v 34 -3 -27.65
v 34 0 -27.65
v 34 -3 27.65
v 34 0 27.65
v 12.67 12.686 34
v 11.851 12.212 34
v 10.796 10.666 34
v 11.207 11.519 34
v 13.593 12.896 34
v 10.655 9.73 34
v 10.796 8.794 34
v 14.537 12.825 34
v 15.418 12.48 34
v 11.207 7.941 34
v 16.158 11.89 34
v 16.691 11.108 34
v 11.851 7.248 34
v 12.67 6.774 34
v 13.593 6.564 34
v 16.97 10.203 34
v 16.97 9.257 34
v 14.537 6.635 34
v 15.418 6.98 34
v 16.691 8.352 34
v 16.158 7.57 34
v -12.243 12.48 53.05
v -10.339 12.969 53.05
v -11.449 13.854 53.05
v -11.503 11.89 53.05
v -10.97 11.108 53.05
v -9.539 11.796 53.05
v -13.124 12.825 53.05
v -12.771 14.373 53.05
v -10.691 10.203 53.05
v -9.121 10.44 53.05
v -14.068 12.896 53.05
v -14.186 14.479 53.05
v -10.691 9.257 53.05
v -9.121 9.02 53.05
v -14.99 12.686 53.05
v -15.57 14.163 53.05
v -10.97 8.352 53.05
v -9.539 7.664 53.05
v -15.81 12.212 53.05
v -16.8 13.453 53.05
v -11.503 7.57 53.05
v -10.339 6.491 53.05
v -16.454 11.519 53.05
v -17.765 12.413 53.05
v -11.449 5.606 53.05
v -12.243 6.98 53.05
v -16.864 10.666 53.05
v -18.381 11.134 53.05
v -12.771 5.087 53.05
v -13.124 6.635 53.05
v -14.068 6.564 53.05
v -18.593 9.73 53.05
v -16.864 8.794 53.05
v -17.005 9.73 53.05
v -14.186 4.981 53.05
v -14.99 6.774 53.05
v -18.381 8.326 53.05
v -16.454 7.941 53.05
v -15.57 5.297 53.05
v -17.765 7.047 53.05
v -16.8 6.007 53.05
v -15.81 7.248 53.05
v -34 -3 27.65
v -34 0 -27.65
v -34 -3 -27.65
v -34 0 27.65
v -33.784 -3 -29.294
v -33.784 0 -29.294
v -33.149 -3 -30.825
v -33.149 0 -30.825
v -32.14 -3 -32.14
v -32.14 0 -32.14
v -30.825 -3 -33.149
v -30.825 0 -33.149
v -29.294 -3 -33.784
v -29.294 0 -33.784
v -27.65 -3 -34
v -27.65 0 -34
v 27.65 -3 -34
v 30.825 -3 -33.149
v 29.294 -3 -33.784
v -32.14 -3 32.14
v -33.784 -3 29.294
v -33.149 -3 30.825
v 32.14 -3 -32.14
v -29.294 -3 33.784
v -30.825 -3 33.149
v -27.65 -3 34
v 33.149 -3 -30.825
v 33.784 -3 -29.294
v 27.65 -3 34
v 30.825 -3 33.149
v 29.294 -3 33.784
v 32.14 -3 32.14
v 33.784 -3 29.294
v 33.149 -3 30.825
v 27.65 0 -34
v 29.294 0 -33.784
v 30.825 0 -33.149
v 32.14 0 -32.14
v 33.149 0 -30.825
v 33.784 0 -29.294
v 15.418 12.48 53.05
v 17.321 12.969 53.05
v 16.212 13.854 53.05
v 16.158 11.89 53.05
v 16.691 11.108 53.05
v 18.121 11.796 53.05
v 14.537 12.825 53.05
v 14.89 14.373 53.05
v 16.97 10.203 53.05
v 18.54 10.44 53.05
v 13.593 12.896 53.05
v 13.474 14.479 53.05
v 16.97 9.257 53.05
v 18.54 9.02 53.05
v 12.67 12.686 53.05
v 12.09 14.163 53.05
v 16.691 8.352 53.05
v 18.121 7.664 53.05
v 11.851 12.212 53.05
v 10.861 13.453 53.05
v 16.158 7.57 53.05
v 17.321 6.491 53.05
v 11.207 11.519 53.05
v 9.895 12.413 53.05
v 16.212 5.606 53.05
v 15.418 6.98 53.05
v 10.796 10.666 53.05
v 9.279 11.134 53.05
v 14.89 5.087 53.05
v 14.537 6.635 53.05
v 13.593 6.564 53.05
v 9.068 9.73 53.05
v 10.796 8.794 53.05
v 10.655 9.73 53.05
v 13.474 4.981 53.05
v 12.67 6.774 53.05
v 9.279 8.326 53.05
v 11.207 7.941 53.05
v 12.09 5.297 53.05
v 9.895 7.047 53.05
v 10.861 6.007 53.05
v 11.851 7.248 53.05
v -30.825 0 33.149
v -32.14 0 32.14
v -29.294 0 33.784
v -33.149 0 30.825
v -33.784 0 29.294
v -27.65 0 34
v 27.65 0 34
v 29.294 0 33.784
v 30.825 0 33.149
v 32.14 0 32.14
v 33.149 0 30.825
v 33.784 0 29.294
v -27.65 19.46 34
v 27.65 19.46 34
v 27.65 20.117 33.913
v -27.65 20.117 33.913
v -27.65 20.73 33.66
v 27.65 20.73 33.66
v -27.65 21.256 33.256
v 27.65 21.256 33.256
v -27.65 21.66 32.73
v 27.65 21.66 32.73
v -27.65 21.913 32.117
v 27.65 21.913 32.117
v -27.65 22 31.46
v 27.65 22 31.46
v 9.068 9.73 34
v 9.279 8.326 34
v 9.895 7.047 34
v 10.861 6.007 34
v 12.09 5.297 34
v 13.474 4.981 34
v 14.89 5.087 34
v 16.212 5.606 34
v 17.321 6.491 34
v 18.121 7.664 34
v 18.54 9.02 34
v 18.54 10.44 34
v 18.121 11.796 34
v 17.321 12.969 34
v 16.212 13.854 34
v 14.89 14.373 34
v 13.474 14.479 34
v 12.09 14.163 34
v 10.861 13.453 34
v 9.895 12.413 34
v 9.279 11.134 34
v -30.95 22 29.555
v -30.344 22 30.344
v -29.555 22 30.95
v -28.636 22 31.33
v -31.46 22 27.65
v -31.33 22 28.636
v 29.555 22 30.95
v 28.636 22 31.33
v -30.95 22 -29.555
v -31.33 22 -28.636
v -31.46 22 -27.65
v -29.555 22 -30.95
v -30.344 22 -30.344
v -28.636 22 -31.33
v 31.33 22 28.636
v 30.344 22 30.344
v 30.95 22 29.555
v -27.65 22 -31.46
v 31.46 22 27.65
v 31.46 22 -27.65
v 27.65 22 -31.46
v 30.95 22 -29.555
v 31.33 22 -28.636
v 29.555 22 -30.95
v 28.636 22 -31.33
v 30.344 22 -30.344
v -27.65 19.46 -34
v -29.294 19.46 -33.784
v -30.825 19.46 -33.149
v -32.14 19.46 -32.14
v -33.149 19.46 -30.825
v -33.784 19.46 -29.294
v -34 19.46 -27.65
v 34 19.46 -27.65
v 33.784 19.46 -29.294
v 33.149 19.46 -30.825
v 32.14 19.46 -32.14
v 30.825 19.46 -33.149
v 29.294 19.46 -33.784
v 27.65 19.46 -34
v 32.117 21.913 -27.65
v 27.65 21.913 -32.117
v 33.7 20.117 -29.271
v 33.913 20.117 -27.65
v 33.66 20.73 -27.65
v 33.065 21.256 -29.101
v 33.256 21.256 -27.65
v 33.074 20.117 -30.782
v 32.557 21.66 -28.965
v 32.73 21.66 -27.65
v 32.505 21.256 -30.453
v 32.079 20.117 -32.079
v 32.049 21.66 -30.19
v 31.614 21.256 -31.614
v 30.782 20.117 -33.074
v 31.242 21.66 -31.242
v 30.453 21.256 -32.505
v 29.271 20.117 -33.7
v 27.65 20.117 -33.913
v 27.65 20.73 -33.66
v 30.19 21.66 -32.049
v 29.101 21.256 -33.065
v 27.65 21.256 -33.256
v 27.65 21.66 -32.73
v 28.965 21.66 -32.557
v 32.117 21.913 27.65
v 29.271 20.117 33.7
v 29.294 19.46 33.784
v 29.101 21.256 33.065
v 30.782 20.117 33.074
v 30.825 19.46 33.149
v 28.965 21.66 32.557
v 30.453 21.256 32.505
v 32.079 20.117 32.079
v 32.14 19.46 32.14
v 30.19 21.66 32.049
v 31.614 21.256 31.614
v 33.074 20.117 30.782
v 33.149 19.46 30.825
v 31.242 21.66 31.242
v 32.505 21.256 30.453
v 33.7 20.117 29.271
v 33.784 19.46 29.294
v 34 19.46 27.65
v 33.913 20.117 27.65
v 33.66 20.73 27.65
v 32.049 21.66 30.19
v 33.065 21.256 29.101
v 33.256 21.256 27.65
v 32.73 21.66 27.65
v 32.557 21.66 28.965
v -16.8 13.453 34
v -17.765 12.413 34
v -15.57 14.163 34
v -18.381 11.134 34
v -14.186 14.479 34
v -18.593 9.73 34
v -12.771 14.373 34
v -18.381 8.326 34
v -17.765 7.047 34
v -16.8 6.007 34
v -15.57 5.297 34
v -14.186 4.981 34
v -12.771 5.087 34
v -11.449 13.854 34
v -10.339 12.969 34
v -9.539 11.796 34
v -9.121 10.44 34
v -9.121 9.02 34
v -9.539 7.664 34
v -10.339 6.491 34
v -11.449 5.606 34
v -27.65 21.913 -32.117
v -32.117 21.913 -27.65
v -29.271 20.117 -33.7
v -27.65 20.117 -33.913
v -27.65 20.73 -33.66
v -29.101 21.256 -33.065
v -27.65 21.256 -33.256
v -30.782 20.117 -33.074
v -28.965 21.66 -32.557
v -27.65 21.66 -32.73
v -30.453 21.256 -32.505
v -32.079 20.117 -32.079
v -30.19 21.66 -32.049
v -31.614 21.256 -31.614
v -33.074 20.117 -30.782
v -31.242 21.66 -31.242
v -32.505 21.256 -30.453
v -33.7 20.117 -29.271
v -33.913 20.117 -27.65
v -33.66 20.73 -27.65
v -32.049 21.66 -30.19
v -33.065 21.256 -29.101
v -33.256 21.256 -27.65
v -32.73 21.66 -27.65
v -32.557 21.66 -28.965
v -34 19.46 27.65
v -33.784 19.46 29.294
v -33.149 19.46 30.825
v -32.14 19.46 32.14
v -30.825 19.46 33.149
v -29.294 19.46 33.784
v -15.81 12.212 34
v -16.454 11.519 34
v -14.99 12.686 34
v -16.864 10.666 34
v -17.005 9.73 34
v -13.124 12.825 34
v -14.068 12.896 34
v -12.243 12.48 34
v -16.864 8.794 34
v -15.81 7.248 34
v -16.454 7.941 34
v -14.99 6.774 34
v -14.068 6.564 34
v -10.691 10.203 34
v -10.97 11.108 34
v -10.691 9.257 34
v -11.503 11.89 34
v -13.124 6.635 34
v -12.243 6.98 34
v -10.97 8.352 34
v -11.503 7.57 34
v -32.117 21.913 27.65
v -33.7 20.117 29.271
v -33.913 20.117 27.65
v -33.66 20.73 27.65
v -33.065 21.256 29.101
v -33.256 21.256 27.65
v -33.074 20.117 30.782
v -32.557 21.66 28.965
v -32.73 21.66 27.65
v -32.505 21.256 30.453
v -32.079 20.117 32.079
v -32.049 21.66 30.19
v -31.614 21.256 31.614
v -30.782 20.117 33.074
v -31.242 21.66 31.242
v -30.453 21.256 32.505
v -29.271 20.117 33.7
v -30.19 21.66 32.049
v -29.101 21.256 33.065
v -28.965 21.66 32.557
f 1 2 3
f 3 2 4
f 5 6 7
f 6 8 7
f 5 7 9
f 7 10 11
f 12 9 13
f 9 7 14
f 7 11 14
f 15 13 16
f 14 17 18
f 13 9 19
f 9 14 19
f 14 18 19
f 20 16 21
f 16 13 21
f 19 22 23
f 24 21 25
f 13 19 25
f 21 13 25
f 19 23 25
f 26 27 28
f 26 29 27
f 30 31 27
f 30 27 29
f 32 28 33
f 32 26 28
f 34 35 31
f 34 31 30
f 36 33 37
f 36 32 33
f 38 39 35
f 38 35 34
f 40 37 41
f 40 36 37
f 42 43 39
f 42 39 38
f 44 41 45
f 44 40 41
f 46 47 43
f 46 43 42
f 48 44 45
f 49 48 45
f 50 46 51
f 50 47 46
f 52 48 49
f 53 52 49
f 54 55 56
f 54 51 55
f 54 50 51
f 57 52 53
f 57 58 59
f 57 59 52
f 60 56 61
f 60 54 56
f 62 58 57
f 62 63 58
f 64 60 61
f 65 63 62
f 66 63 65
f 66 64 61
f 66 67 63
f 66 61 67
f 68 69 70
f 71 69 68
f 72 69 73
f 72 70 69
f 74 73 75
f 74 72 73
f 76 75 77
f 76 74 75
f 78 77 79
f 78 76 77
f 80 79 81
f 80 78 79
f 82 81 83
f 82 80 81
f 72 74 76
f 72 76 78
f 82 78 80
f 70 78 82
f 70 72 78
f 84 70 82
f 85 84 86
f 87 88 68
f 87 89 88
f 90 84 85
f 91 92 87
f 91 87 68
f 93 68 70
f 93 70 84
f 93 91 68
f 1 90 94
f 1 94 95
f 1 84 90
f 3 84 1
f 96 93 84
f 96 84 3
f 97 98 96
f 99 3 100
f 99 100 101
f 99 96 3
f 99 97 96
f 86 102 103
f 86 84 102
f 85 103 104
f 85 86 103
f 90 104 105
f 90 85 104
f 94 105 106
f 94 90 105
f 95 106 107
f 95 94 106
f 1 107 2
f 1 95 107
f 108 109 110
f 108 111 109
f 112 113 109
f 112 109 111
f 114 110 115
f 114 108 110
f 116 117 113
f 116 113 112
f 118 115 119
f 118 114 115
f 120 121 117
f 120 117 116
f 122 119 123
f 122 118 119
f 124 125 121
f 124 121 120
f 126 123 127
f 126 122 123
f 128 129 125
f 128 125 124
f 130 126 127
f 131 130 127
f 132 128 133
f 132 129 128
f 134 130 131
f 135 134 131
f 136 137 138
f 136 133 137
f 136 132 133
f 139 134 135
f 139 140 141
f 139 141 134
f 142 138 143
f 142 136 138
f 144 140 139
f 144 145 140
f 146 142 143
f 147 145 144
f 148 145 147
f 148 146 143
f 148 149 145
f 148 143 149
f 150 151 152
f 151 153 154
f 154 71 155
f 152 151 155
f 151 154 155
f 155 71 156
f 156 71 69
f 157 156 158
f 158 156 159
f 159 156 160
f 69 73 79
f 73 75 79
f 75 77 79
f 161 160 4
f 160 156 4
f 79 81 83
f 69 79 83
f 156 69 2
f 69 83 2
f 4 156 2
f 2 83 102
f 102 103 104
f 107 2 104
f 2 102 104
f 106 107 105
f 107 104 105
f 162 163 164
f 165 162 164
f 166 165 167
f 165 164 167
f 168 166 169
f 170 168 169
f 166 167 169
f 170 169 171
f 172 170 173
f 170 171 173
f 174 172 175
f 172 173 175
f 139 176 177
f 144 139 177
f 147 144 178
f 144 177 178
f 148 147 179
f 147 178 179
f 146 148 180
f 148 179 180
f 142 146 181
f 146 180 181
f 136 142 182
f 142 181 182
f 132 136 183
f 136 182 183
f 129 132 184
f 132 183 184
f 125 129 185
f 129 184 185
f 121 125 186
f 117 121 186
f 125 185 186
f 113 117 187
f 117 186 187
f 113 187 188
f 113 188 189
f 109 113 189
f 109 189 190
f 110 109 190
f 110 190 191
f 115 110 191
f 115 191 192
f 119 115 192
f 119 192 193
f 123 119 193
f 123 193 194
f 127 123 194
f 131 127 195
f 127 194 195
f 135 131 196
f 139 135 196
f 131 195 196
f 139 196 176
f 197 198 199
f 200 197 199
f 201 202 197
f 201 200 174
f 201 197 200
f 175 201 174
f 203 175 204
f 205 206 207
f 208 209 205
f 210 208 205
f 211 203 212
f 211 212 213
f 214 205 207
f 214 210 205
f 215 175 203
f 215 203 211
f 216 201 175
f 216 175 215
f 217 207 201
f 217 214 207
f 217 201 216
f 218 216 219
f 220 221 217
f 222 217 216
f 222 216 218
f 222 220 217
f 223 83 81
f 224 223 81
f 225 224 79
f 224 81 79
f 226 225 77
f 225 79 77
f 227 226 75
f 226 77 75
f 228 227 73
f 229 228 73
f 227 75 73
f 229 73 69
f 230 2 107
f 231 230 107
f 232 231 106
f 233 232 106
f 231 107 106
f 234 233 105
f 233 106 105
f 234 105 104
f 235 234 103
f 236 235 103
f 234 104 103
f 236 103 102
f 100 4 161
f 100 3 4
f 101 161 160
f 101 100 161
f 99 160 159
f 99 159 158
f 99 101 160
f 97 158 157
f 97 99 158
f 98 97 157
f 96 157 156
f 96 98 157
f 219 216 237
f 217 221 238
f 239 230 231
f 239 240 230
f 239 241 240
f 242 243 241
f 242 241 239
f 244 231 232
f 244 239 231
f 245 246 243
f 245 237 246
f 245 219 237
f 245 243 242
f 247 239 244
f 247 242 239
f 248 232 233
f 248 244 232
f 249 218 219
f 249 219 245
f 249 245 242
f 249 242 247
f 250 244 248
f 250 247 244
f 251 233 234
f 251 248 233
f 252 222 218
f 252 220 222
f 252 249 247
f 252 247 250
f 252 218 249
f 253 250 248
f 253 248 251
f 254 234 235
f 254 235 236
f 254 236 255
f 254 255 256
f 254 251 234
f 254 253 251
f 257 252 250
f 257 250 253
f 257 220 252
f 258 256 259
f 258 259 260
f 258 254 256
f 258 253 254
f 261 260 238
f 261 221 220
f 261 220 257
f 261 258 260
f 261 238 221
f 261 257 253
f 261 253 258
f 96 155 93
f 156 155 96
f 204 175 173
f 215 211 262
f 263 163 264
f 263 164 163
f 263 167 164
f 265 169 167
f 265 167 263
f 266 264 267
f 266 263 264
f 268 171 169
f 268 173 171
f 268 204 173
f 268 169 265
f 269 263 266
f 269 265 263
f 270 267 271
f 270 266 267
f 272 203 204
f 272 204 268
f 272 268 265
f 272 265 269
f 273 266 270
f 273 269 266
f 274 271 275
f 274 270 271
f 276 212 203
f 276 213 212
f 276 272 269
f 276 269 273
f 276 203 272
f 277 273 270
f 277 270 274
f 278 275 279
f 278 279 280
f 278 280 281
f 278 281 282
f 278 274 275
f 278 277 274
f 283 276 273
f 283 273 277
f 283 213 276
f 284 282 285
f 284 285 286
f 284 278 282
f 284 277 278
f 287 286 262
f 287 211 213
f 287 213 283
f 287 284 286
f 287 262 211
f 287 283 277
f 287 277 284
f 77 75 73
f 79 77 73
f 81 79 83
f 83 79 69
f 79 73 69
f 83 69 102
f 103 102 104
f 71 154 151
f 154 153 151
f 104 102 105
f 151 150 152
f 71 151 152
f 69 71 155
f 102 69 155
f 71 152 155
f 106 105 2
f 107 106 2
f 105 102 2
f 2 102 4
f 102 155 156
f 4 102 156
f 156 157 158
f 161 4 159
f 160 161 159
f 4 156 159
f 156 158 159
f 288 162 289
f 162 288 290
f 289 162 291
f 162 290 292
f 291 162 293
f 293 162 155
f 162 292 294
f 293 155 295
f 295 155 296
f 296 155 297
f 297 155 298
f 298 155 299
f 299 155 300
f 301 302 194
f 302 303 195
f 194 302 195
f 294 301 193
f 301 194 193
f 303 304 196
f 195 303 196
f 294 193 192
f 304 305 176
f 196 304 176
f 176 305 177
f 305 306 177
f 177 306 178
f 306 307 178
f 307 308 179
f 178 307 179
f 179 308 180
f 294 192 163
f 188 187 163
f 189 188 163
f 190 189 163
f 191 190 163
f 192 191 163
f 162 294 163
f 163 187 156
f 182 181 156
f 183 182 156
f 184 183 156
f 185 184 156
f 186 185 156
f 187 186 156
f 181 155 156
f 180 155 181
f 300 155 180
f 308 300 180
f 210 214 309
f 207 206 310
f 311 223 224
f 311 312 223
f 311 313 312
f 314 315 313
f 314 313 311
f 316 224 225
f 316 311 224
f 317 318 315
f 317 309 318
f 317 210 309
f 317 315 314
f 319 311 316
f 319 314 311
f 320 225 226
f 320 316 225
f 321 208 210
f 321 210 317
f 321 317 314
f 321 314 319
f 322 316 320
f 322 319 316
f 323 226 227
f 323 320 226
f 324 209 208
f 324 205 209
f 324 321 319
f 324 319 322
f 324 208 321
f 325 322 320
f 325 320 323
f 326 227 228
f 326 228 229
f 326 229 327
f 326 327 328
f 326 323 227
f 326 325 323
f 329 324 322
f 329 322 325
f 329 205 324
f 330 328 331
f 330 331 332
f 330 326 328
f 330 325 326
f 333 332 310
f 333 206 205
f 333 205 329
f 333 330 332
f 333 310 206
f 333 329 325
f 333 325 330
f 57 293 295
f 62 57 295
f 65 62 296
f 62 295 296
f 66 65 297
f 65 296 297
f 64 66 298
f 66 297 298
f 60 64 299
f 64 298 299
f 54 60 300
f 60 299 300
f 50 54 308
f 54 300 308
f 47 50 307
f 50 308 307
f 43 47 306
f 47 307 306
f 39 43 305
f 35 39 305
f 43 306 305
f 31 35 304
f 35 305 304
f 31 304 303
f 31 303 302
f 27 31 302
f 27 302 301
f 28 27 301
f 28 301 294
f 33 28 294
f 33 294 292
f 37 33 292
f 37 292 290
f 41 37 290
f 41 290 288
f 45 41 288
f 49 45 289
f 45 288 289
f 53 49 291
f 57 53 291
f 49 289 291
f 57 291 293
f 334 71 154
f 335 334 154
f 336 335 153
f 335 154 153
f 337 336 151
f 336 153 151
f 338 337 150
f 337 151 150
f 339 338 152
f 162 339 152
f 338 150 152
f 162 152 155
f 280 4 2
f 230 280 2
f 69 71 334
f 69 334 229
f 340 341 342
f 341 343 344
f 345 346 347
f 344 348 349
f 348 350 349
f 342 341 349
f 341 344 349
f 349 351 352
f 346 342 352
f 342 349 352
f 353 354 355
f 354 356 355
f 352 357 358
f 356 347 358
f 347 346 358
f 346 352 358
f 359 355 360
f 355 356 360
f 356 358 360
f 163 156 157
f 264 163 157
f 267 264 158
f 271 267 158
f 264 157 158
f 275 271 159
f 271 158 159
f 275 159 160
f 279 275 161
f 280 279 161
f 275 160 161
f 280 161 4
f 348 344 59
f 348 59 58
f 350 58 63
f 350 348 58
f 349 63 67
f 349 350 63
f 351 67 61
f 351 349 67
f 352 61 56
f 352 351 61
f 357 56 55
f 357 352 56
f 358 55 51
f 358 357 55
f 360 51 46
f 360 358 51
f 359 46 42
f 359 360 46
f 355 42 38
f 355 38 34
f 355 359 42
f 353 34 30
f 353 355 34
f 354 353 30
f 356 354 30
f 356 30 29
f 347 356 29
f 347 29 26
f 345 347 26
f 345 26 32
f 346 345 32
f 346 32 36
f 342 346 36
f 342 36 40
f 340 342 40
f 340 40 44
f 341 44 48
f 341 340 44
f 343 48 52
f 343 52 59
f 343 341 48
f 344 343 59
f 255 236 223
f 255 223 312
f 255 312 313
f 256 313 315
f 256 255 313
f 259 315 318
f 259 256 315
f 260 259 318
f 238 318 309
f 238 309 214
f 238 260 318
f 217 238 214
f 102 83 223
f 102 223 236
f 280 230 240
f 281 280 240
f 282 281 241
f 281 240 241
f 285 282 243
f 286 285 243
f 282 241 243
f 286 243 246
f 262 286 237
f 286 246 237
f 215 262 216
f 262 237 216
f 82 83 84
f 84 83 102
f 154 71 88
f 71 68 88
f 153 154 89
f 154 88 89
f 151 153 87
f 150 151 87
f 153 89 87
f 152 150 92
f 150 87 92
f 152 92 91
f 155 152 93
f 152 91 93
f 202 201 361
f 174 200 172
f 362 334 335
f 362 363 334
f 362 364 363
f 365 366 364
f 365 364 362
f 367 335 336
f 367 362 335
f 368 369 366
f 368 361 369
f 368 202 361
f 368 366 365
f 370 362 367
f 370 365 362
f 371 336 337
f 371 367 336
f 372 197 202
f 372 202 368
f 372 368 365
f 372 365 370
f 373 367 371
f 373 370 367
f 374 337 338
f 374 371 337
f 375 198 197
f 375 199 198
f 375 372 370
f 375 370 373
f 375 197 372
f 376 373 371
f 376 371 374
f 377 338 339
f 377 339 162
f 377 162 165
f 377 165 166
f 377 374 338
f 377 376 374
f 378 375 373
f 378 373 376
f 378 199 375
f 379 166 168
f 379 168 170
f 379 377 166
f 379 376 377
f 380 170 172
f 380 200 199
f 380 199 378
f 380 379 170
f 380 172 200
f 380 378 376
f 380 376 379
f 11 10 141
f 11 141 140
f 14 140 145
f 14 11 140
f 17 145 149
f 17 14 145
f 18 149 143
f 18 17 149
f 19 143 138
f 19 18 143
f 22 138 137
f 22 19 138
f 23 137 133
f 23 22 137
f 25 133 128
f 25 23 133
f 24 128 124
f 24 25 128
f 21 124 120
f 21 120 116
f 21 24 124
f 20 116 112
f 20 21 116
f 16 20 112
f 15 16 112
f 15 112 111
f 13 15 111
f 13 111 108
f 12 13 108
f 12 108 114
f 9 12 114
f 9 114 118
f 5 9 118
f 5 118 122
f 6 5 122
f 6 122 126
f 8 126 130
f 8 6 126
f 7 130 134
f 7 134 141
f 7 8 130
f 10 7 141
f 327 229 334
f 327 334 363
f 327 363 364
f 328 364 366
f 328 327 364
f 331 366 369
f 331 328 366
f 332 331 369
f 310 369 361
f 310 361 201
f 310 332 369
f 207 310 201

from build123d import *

# Parameters (mm, degrees)
SKETCH1_W           = 68
SKETCH1_H           = 68
BOSS_EXTRUDE1_DEPTH = 22
FILLET1_R           = 2.54
FILLET2_R           = 6.35
SKETCH2_R           = 4.7625
SKETCH2_R_2         = 3.175
BOSS_EXTRUDE2_DEPTH = 19.05
SKETCH3_W           = 68
SKETCH3_H           = 68
BOSS_EXTRUDE3_DEPTH = 3
FILLET3_R           = 6.35


with BuildPart() as part:
    # Sketch1 → Boss-Extrude1 (new body)
    with BuildSketch(Plane(origin=(0, 0, 0), x_dir=(1, 0, 0), z_dir=(0, 1, 0))):
        Rectangle(SKETCH1_W, SKETCH1_H)
    extrude(amount=BOSS_EXTRUDE1_DEPTH)

    # Fillet1
    fillet1_edges = [part.edges().sort_by_distance(p)[0] for p in [
        (-34, 22, 0),
        (0, 22, 34),
        (34, 22, 0),
        (0, 22, -34),
    ]]
    fillet(fillet1_edges, radius=FILLET1_R)

    # Fillet2
    # the kernel refuses this fillet: 6.35 mm, written as the material it takes off along each edge
    with BuildSketch(Plane(origin=(27.65, 22, -27.65), x_dir=(1, 0, 0), z_dir=(0, 0, 1))) as fillet2_piece_1:
        with BuildLine():
            CenterArc((3.81, -2.54), 2.54, 0, 90)
            Line((6.35, -2.54), (6.35, 0))
            Line((6.35, 0), (3.81, 0))
        make_face()
    revolve(axis=Axis((27.65, 22, -27.65), (0, 1, 0)), revolution_arc=90, mode=Mode.SUBTRACT)
    with BuildSketch(Plane(origin=(27.65, 22, 27.65), x_dir=(0, 0, 1), z_dir=(-1, 0, 0))) as fillet2_piece_2:
        with BuildLine():
            CenterArc((3.81, -2.54), 2.54, 0, 90)
            Line((6.35, -2.54), (6.35, 0))
            Line((6.35, 0), (3.81, 0))
        make_face()
    revolve(axis=Axis((27.65, 22, 27.65), (0, 1, 0)), revolution_arc=90, mode=Mode.SUBTRACT)
    with BuildSketch(Plane(origin=(-27.65, 22, -27.65), x_dir=(0, 0, -1), z_dir=(1, 0, 0))) as fillet2_piece_3:
        with BuildLine():
            CenterArc((3.81, -2.54), 2.54, 0, 90)
            Line((6.35, -2.54), (6.35, 0))
            Line((6.35, 0), (3.81, 0))
        make_face()
    revolve(axis=Axis((-27.65, 22, -27.65), (0, 1, 0)), revolution_arc=90, mode=Mode.SUBTRACT)
    with BuildSketch(Plane(origin=(-27.65, 22, 27.65), x_dir=(-1, 0, 0), z_dir=(0, 0, -1))) as fillet2_piece_4:
        with BuildLine():
            CenterArc((3.81, -2.54), 2.54, 0, 90)
            Line((6.35, -2.54), (6.35, 0))
            Line((6.35, 0), (3.81, 0))
        make_face()
    revolve(axis=Axis((-27.65, 22, 27.65), (0, 1, 0)), revolution_arc=90, mode=Mode.SUBTRACT)
    with BuildSketch(Plane(origin=(-34, -15.875, 34), x_dir=(0, 0, -1), z_dir=(0, 1, 0)), Plane(origin=(-34, -15.875, -34), x_dir=(1, 0, 0), z_dir=(0, 1, 0))) as fillet2_piece_5:
        with BuildLine():
            CenterArc((FILLET2_R, -FILLET2_R), FILLET2_R, 90, 90)
            Line((0, -FILLET2_R), (0, 0))
            Line((0, 0), (FILLET2_R, 0))
        make_face()
    extrude(amount=37.875, mode=Mode.SUBTRACT)
    with BuildSketch(Plane(origin=(34, -15.875, -34), x_dir=(-1, 0, 0), z_dir=(0, 1, 0)), Plane(origin=(34, -15.875, 34), x_dir=(0, 0, -1), z_dir=(0, 1, 0))) as fillet2_piece_6:
        with BuildLine():
            CenterArc((FILLET2_R, FILLET2_R), FILLET2_R, 180, 90)
            Line((0, FILLET2_R), (0, 0))
            Line((0, 0), (FILLET2_R, 0))
        make_face()
    extrude(amount=37.875, mode=Mode.SUBTRACT)

    # Sketch2 → Boss-Extrude2 (add)
    # profile 1 of 2: a face of its own
    with BuildSketch(Plane.XY.offset(34)):
        with Locations(Location((-13.8303, 9.73, 0), (0, 0, 180))):
            Circle(SKETCH2_R)
        with Locations(Location((-13.8303, 9.73, 0), (0, 0, 180))):
            Circle(SKETCH2_R_2, mode=Mode.SUBTRACT)
    # profile 2 of 2: a face of its own
    with BuildSketch(Plane.XY.offset(34)):
        with Locations(Location((13.8303, 9.73, 0), (0, 0, 180))):
            Circle(SKETCH2_R)
        with Locations(Location((13.8303, 9.73, 0), (0, 0, 180))):
            Circle(SKETCH2_R_2, mode=Mode.SUBTRACT)
    extrude(amount=BOSS_EXTRUDE2_DEPTH)


with BuildPart() as body_2:
    # Sketch3 → Boss-Extrude3 (new body)
    with BuildSketch(Plane.XZ):
        Rectangle(SKETCH3_W, SKETCH3_H)
    extrude(amount=BOSS_EXTRUDE3_DEPTH)

    # Fillet3
    fillet3_edges = [body_2.edges().sort_by_distance(p)[0] for p in [
        (34, -1.5, -34),
        (-34, -1.5, -34),
        (-34, -1.5, 34),
        (34, -1.5, 34),
    ]]
    fillet(fillet3_edges, radius=FILLET3_R)


solid = Compound([part.part, body_2.part])
